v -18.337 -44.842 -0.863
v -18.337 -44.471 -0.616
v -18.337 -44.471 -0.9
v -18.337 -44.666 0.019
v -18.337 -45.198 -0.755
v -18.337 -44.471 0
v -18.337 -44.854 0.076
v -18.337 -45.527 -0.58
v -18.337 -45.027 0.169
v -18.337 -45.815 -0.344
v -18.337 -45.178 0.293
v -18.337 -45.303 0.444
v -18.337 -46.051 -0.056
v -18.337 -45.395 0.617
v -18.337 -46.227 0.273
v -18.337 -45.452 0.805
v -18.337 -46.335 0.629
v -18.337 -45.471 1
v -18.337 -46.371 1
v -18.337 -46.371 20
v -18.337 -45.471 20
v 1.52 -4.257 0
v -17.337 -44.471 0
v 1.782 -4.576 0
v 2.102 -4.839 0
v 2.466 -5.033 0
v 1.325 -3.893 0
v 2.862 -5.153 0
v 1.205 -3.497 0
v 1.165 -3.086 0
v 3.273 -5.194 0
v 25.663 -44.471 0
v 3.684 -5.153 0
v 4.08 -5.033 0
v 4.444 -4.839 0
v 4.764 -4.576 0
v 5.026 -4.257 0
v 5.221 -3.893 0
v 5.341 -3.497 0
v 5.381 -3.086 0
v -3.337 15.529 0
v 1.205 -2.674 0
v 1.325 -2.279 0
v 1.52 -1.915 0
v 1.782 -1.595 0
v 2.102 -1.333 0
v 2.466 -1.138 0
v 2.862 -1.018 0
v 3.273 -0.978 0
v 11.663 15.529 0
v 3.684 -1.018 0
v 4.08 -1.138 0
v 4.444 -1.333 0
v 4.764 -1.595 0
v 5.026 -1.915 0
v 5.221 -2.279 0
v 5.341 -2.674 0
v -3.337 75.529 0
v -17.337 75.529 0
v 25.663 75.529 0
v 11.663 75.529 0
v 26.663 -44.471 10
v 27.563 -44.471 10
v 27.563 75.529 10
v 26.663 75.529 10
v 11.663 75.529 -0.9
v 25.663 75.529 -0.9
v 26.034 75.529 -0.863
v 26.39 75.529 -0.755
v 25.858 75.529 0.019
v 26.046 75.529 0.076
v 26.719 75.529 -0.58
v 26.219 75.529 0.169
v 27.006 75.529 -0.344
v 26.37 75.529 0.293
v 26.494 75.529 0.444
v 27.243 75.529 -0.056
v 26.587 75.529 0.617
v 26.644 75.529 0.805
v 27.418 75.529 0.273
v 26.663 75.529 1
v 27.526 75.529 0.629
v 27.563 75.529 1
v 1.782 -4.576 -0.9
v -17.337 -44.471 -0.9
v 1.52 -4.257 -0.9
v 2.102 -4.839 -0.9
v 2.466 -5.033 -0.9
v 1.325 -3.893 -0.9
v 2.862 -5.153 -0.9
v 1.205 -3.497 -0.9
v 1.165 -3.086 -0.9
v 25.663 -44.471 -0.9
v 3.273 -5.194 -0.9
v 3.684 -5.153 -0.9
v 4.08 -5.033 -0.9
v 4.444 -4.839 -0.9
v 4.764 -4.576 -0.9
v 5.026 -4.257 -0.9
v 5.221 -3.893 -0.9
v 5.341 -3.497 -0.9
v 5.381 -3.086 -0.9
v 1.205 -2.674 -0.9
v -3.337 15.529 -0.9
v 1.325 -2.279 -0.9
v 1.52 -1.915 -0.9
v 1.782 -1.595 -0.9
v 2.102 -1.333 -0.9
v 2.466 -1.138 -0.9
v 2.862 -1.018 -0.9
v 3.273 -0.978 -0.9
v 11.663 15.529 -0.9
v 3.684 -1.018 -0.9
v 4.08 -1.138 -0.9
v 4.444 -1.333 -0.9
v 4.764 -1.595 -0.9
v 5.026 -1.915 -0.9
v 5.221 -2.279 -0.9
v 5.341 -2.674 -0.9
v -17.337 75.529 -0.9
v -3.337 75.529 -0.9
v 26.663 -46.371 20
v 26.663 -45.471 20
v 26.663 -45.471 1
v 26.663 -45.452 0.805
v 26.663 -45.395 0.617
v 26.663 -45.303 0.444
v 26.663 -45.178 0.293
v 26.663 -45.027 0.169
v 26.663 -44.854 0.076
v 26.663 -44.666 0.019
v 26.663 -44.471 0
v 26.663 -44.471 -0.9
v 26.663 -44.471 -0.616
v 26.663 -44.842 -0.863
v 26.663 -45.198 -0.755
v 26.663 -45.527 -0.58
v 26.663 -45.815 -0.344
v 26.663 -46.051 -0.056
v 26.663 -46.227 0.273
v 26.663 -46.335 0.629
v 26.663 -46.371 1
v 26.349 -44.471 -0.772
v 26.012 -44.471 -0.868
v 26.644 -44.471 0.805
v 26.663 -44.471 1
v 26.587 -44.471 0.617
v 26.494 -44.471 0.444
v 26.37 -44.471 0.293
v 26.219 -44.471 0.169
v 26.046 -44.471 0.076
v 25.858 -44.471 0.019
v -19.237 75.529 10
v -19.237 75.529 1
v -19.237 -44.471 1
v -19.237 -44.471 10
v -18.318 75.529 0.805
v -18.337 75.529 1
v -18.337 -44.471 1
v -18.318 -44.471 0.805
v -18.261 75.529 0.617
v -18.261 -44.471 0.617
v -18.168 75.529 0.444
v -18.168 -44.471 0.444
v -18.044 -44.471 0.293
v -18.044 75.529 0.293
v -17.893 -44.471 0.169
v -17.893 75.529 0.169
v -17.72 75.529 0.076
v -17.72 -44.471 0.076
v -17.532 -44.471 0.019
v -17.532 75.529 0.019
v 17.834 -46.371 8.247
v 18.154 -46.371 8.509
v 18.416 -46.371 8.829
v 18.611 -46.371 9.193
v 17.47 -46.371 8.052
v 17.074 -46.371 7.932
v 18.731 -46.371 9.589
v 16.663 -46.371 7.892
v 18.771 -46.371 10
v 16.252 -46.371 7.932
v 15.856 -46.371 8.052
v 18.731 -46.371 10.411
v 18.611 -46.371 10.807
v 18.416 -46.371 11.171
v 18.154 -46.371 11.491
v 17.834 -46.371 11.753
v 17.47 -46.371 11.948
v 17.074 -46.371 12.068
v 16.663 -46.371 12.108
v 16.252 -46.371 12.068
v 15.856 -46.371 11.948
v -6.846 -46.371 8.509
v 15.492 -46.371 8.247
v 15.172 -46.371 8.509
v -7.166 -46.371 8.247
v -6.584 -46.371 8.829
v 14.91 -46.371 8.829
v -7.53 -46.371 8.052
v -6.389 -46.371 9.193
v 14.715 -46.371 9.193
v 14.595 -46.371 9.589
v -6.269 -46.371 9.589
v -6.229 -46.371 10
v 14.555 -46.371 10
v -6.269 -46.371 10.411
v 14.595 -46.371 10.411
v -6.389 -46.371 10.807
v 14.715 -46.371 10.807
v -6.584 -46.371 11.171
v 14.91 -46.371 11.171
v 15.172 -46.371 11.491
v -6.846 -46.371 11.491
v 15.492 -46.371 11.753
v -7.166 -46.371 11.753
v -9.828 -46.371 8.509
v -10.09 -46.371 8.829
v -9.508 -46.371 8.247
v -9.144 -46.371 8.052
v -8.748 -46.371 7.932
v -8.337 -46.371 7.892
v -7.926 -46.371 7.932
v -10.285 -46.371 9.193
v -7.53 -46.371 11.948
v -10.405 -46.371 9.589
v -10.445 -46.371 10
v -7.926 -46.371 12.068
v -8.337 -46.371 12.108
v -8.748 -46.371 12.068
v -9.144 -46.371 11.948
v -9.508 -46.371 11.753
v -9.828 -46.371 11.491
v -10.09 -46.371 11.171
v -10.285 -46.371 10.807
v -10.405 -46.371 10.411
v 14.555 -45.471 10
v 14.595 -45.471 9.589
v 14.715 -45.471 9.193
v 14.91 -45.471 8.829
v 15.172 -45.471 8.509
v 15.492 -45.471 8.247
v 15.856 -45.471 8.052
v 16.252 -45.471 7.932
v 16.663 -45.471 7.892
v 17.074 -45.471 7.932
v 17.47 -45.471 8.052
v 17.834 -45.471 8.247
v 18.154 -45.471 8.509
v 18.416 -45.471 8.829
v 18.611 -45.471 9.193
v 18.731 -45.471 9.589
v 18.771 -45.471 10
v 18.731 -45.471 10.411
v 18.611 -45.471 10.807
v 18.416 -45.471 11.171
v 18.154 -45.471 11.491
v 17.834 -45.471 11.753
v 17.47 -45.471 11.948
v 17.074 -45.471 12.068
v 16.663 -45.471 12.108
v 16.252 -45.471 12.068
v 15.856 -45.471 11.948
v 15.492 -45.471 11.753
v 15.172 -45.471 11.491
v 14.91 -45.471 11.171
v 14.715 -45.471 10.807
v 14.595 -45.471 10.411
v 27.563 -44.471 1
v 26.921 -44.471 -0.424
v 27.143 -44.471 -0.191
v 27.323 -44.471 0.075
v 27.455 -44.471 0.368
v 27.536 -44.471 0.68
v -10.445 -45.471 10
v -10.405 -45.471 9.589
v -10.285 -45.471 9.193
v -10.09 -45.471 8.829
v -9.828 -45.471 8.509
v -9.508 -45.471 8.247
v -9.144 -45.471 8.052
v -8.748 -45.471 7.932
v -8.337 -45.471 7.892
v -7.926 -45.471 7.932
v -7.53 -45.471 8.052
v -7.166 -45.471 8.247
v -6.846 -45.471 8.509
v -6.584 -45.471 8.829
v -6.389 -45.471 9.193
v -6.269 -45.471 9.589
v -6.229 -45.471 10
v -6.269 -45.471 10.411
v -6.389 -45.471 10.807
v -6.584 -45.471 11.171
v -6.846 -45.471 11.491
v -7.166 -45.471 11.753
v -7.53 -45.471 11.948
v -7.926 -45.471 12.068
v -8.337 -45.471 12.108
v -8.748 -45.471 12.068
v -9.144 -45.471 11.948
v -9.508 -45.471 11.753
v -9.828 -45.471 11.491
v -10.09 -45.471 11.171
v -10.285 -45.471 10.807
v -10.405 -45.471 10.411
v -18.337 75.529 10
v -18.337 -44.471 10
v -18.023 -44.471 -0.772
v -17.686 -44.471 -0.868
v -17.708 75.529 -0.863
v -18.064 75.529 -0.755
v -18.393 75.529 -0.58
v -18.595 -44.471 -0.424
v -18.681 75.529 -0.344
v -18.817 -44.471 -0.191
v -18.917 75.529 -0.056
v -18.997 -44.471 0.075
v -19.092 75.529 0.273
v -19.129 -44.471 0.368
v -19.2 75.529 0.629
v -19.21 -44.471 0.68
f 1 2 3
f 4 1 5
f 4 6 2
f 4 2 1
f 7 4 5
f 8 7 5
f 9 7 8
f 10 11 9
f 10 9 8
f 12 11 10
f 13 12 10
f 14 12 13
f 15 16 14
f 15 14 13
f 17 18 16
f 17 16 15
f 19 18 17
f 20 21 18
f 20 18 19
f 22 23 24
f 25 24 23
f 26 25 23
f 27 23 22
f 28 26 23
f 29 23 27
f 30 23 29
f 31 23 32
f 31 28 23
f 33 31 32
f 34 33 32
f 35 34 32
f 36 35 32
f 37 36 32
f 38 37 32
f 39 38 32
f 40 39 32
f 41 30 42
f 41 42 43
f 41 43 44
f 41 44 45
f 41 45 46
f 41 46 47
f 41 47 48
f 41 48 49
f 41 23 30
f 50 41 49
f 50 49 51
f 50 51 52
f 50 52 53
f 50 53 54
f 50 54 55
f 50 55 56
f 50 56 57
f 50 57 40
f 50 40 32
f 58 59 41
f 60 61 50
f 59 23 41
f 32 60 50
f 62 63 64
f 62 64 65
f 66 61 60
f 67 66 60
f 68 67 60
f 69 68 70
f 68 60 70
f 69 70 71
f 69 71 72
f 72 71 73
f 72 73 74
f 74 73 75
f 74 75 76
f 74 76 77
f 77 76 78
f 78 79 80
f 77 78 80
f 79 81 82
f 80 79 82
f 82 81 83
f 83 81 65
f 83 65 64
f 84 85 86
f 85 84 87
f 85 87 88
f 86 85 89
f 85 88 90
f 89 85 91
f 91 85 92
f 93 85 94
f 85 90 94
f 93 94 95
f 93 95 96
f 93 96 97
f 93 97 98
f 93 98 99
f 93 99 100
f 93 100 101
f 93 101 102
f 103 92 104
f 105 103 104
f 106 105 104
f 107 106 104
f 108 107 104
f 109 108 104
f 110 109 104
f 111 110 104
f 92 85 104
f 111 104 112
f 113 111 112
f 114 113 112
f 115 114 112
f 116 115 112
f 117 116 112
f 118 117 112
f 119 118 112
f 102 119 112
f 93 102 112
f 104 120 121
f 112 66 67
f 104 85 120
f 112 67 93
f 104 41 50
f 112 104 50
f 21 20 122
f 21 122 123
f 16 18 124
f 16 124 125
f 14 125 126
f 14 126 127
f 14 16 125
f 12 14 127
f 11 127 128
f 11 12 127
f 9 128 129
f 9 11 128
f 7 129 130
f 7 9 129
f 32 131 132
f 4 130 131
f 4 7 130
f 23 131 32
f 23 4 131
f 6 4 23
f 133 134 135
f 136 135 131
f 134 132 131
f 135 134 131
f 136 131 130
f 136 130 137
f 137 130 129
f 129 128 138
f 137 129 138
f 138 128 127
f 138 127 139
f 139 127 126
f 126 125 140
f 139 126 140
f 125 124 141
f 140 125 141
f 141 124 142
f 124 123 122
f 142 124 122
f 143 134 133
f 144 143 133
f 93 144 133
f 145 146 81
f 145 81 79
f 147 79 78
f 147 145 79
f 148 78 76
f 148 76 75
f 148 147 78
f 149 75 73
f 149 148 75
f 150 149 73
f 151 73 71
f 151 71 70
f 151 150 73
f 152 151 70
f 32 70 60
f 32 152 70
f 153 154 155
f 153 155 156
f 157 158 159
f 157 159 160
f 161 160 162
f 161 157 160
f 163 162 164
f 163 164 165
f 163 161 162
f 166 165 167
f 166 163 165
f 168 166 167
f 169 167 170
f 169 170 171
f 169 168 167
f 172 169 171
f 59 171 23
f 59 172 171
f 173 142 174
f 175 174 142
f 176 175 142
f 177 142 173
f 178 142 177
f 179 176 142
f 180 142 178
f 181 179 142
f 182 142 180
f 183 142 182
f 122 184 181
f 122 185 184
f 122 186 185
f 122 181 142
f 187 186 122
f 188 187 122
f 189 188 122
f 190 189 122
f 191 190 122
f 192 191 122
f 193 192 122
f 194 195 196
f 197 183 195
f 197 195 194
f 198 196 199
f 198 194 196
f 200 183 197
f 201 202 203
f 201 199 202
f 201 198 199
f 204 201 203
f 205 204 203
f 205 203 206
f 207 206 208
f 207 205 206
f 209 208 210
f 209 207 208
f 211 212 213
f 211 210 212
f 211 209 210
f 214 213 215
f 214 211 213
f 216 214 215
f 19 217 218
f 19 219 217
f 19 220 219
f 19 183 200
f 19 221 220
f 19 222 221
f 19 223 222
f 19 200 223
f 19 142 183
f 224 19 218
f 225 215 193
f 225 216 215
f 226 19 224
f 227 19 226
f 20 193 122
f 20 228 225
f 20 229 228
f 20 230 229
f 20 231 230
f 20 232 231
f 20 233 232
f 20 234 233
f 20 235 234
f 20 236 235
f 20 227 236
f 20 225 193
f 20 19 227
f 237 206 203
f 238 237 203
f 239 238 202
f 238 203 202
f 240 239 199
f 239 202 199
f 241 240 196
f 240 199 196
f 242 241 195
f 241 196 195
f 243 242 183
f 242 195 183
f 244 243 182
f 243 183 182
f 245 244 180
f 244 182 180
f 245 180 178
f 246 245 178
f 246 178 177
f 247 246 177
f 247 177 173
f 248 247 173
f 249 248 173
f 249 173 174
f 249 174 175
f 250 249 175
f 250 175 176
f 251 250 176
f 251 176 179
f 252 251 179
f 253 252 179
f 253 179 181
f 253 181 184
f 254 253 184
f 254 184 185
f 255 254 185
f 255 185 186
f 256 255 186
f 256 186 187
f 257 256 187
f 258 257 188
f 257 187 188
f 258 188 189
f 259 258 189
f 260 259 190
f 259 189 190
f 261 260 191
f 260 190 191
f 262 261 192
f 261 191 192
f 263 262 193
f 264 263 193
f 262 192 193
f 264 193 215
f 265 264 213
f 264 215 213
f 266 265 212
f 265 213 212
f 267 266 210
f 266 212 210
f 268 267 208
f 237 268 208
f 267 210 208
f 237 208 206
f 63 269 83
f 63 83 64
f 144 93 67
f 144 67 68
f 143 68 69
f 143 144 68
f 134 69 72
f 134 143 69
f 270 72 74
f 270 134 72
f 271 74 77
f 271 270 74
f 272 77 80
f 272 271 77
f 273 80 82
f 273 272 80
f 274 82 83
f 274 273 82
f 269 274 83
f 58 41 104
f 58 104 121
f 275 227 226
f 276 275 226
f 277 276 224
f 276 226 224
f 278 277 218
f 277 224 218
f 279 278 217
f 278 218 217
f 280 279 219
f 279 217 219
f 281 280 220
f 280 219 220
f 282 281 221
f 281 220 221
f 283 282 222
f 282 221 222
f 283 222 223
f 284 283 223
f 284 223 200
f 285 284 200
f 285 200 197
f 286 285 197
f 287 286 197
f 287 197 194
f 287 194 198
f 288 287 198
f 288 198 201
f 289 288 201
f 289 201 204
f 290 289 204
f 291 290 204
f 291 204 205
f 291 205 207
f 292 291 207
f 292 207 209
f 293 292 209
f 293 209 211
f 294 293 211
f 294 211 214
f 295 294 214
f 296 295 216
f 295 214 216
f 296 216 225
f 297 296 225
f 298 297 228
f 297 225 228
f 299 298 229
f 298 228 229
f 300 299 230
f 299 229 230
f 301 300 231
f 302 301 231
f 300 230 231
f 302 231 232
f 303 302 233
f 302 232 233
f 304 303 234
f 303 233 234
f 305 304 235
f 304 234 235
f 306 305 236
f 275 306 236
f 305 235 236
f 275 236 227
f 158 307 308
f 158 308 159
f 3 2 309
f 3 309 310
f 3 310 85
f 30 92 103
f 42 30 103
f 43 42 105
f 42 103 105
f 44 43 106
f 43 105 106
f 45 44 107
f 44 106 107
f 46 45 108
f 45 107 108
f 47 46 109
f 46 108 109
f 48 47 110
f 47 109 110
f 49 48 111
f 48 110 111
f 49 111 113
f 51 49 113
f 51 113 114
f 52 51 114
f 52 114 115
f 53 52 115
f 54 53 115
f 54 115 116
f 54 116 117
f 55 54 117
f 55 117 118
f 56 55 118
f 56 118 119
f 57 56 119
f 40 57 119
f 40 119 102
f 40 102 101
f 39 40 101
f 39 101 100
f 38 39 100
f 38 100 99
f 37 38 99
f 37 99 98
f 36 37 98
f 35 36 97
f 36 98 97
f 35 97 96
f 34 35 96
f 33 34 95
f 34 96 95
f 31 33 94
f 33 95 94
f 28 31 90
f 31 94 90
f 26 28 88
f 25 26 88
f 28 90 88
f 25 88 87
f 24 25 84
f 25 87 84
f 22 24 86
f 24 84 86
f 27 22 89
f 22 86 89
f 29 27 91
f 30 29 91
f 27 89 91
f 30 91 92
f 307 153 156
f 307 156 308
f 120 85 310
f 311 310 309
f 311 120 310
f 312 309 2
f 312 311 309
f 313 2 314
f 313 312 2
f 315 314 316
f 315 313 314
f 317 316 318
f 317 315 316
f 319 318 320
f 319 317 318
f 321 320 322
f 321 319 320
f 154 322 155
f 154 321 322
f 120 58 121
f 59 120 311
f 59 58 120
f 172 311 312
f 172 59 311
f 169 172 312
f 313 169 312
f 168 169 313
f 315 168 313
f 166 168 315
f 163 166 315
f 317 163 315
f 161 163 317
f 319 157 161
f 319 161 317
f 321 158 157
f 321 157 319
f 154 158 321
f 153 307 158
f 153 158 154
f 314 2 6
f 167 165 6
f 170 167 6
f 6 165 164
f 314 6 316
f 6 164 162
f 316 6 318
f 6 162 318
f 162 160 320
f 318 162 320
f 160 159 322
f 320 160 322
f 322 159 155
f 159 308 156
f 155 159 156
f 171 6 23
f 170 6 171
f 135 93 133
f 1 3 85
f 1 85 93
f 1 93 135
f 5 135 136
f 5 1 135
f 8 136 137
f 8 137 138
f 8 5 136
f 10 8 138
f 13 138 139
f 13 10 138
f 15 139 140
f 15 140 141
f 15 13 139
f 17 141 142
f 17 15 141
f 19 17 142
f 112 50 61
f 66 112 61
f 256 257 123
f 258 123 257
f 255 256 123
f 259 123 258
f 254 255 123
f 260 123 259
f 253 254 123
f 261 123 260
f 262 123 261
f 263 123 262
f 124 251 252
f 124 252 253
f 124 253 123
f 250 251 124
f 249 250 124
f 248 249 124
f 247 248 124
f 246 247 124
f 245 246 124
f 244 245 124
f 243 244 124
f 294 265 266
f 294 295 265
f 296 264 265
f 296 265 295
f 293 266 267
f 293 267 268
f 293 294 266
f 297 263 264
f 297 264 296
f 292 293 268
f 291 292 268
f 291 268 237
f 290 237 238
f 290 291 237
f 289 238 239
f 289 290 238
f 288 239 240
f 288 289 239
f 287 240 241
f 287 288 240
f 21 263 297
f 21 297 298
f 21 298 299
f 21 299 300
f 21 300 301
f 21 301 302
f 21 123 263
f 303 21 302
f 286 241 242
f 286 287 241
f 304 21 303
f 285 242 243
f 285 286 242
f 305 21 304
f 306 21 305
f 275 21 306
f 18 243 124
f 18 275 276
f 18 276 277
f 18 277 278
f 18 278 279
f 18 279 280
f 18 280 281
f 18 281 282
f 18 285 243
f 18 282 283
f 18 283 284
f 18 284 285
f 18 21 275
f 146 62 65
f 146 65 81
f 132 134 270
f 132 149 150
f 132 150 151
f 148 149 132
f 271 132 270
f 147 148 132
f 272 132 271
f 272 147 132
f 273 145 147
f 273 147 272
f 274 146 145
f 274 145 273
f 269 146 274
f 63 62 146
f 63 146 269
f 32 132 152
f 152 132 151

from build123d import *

# Parameters (mm, degrees)
SKETCH1_W                    = 45
SKETCH1_H                    = 120
BASE_FLANGE2_DEPTH           = 0.9
EDGE_FLANGE2_DEPTH           = 45
SKETCH17_W                   = 15
SKETCH17_H                   = 60
CUT_EXTRUDE1_DEPTH           = 10
EDGE_FLANGE4_STRIP_W         = 5.6
EDGE_FLANGE4_STRIP_H         = 0.9
EDGE_FLANGE4_STRIP_CUT_DEPTH = 120
EDGE_FLANGE4_DEPTH           = 120
EDGE_FLANGE5_STRIP_W         = 5.6
EDGE_FLANGE5_STRIP_H         = 0.9
EDGE_FLANGE5_STRIP_CUT_DEPTH = 120
EDGE_FLANGE5_DEPTH           = 120
F_19_0_166_DIAMETER_SLOT2_D  = 4.2164
F_19_0_166_DIAMETER_SLOT1_D  = 4.2164


# Sheet-metal steps are written as plain solids
with BuildPart() as part:
    # Sketch1 → Base-Flange2 (new body)
    with BuildSketch(Plane.XY):
        with Locations((4.162995595, 15.528634361)):
            Rectangle(SKETCH1_W, SKETCH1_H)
    extrude(amount=-BASE_FLANGE2_DEPTH)

    # Edge-Flange2 section (across the edge) → Edge-Flange2 (add)
    with BuildSketch(Plane(origin=(-18.337004405, -45.471365639, 0), x_dir=(0, 1, 0), z_dir=(1, 0, 0))):
        with BuildLine():
            Line((-0.9, 1), (-0.9, 20))
            Line((-0.9, 20), (0, 20))
            Line((0, 20), (0, 1))
            ThreePointArc((0, 1), (0.292893219, 0.292893219), (1, 0))
            Line((1, 0), (1, -0.9))
            ThreePointArc((1, -0.9), (-0.343502884, -0.343502884), (-0.9, 1))
        make_face()
    extrude(amount=EDGE_FLANGE2_DEPTH)

    # Sketch17 → Cut-Extrude1 (cut)
    with BuildSketch(Plane.XY):
        with Locations((4.162995595, 45.528634361)):
            Rectangle(SKETCH17_W, SKETCH17_H)
    extrude(amount=-CUT_EXTRUDE1_DEPTH, mode=Mode.SUBTRACT)

    # Edge-Flange4 strip (across the edge) → Edge-Flange4 strip cut (cut)
    with BuildSketch(Plane(origin=(-18.337004405, 75.528634361, 0), x_dir=(1, 0, 0), z_dir=(0, -1, 0))):
        with Locations((-1.8, -0.45)):
            Rectangle(EDGE_FLANGE4_STRIP_W, EDGE_FLANGE4_STRIP_H)
    extrude(amount=EDGE_FLANGE4_STRIP_CUT_DEPTH, mode=Mode.SUBTRACT)

    # Edge-Flange4 section (across the edge) → Edge-Flange4 (add)
    with BuildSketch(Plane(origin=(-18.337004405, 75.528634361, 0), x_dir=(1, 0, 0), z_dir=(0, -1, 0))):
        with BuildLine():
            Line((-0.9, 1), (-0.9, 10))
            Line((-0.9, 10), (0, 10))
            Line((0, 10), (0, 1))
            ThreePointArc((0, 1), (0.292893219, 0.292893219), (1, 0))
            Line((1, 0), (1, -0.9))
            ThreePointArc((1, -0.9), (-0.343502884, -0.343502884), (-0.9, 1))
        make_face()
    extrude(amount=EDGE_FLANGE4_DEPTH)

    # Edge-Flange5 strip (across the edge) → Edge-Flange5 strip cut (cut)
    with BuildSketch(Plane(origin=(26.662995595, -44.471365639, 0), x_dir=(-1, 0, 0), z_dir=(0, 1, 0))):
        with Locations((-1.8, -0.45)):
            Rectangle(EDGE_FLANGE5_STRIP_W, EDGE_FLANGE5_STRIP_H)
    extrude(amount=EDGE_FLANGE5_STRIP_CUT_DEPTH, mode=Mode.SUBTRACT)

    # Edge-Flange5 section (across the edge) → Edge-Flange5 (add)
    with BuildSketch(Plane(origin=(26.662995595, -44.471365639, 0), x_dir=(-1, 0, 0), z_dir=(0, 1, 0))):
        with BuildLine():
            Line((-0.9, 1), (-0.9, 10))
            Line((-0.9, 10), (0, 10))
            Line((0, 10), (0, 1))
            ThreePointArc((0, 1), (0.292893219, 0.292893219), (1, 0))
            Line((1, 0), (1, -0.9))
            ThreePointArc((1, -0.9), (-0.343502884, -0.343502884), (-0.9, 1))
        make_face()
    extrude(amount=EDGE_FLANGE5_DEPTH)

    # #19 (0.166) Diameter Slot2 (through all)
    with Locations(Plane(origin=(0, -45.471365639, 0), x_dir=(1, 0, 0), z_dir=(0, 1, 0))):
        with Locations((16.662995595, -10), (-8.337004405, -10)):
            Hole(F_19_0_166_DIAMETER_SLOT2_D / 2)

    # #19 (0.166) Diameter Slot1 (through all)
    with Locations(Plane.XY):
        with Locations((3.27299702, -3.085765259)):
            Hole(F_19_0_166_DIAMETER_SLOT1_D / 2)


solid = part.part
